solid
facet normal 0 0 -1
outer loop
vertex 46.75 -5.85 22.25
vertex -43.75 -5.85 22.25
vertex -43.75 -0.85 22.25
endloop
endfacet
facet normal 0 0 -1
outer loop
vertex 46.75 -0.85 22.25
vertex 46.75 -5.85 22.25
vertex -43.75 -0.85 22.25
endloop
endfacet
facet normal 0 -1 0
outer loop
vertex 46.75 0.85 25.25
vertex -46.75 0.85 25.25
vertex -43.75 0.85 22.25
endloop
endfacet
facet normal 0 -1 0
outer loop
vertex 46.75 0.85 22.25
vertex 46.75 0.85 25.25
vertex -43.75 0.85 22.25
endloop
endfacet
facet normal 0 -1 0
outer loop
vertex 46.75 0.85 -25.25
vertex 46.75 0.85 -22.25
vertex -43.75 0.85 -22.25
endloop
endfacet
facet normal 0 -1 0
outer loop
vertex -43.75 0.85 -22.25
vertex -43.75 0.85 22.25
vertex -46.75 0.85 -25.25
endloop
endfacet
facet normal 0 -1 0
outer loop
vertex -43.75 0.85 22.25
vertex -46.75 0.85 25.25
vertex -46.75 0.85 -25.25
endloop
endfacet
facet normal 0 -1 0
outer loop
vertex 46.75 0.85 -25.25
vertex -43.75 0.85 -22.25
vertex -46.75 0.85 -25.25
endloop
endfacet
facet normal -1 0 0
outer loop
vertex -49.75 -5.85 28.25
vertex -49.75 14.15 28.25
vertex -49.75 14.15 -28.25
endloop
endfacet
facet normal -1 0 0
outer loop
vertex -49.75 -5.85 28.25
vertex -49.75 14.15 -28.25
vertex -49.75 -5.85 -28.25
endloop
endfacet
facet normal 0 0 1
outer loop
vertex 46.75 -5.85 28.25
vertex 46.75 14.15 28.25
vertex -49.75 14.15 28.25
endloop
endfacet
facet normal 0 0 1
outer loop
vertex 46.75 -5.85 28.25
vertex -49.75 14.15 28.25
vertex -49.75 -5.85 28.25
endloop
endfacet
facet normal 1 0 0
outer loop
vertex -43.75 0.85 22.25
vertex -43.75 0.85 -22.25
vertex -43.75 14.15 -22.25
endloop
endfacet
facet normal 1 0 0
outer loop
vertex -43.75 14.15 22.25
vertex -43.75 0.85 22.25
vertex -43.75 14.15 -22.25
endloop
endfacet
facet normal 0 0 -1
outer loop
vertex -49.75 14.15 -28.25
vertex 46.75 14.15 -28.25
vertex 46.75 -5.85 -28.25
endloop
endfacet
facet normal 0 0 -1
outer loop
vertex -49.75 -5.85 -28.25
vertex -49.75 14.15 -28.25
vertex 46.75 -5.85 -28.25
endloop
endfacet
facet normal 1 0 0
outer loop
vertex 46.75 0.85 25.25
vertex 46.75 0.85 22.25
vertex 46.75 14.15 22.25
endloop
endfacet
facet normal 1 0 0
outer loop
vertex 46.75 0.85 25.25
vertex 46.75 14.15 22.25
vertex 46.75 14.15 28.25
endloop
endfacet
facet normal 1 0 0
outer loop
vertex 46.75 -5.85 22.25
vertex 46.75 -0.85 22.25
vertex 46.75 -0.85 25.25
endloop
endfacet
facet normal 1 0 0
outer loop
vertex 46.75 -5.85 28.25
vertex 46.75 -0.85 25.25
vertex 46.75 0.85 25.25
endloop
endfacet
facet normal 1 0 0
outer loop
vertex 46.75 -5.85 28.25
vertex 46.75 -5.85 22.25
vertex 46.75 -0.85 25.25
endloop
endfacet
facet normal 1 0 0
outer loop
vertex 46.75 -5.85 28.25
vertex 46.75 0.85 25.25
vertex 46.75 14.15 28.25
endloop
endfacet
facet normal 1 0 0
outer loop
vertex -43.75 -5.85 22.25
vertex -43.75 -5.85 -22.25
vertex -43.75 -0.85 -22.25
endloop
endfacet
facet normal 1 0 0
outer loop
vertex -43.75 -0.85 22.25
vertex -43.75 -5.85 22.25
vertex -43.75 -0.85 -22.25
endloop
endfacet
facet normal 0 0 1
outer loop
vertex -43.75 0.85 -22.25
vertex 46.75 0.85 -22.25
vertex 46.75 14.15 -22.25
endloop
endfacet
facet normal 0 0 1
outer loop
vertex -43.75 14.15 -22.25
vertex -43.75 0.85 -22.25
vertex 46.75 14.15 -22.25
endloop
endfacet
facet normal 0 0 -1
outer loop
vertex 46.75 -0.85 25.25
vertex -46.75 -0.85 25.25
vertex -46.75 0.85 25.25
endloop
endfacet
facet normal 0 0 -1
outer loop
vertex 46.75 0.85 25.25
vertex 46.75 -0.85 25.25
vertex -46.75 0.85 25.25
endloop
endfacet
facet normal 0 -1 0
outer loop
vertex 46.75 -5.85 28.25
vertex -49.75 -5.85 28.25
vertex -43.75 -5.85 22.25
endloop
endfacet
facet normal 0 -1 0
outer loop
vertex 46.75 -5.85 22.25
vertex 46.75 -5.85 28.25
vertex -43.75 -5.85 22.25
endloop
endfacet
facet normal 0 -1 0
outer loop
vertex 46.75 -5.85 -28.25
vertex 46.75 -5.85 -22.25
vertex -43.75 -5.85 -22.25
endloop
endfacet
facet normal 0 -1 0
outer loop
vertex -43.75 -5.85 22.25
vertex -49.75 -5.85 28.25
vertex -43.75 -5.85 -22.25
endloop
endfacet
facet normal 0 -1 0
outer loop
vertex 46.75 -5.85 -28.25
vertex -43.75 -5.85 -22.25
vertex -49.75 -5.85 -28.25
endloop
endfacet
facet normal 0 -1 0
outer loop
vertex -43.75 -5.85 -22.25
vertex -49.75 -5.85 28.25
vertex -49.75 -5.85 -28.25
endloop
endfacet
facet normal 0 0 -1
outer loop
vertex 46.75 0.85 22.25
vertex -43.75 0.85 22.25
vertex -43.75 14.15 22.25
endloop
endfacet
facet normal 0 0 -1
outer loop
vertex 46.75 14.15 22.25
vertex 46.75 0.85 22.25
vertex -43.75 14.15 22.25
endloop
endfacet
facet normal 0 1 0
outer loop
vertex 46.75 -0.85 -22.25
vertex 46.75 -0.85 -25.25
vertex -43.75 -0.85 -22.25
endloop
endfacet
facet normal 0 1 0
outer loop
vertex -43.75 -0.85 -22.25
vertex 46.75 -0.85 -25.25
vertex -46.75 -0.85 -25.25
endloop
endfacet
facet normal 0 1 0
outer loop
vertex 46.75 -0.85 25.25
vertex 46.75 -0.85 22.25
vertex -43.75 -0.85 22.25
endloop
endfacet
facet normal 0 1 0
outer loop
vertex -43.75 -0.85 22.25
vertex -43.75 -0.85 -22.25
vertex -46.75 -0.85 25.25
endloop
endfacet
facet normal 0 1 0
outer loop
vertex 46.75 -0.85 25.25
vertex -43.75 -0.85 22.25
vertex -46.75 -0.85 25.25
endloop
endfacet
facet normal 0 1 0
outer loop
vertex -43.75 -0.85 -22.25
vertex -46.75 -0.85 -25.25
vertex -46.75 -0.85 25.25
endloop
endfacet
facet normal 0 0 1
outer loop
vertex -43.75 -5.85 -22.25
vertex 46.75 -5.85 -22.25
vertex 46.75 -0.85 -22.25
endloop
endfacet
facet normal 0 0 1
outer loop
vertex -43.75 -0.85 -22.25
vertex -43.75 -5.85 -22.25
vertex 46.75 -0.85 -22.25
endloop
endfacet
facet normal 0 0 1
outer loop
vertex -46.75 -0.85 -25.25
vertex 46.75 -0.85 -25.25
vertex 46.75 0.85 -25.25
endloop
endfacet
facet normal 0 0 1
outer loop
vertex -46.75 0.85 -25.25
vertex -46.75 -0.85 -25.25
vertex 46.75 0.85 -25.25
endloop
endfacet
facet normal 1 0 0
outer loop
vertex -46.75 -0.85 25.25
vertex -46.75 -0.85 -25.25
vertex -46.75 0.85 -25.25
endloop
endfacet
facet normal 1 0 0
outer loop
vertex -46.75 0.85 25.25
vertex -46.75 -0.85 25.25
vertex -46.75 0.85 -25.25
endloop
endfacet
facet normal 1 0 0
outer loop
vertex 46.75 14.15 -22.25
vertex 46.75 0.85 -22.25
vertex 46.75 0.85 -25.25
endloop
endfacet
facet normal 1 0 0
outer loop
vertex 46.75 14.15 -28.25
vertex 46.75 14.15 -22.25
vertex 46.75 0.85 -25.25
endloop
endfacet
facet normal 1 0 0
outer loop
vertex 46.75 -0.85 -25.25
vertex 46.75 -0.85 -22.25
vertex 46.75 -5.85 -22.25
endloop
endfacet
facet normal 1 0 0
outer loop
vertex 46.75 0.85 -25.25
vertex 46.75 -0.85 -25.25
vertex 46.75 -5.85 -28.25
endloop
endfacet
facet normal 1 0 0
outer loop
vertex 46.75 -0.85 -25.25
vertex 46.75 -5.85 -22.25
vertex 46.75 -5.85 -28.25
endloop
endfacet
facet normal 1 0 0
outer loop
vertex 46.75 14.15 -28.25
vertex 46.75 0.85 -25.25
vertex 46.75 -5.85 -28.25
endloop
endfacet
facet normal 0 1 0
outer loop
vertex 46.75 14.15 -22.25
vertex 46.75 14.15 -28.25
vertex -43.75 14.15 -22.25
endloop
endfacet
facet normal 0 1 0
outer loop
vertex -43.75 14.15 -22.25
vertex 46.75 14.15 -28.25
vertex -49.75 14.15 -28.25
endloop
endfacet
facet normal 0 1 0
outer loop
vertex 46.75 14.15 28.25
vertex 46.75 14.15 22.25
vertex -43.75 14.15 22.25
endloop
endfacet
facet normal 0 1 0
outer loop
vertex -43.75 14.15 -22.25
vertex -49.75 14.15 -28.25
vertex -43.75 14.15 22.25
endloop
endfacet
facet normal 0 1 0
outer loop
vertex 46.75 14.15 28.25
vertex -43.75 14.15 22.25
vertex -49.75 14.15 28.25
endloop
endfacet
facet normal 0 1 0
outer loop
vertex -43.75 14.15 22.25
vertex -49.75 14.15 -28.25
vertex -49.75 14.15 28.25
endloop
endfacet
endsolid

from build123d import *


with BuildPart() as part:
    # Sweep1: sweep along a path in Sketch1
    with BuildLine(Plane(origin=(0, 0, 0), x_dir=(1, 0, 0), z_dir=(0, 1, 0))) as sweep1_path:
        Line((46.75, -25.25), (-46.75, -25.25))
        Line((-46.75, -25.25), (-46.75, 25.25))
        Line((-46.75, 25.25), (46.75, 25.25))
    # Sketch2 → Sweep1 (sweep)
    with BuildSketch(Plane(origin=(46.75, 0, 0), x_dir=(0, 0, -1), z_dir=(1, 0, 0))):
        Polygon((-25.25, 0.85), (-25.25, -0.85), (-22.25, -0.85), (-22.25, -5.85), (-28.25, -5.85), (-28.25, 14.15), (-22.25, 14.15), (-22.25, 0.85), align=None)
    sweep(path=sweep1_path.line, transition=Transition.RIGHT)


solid = part.part
